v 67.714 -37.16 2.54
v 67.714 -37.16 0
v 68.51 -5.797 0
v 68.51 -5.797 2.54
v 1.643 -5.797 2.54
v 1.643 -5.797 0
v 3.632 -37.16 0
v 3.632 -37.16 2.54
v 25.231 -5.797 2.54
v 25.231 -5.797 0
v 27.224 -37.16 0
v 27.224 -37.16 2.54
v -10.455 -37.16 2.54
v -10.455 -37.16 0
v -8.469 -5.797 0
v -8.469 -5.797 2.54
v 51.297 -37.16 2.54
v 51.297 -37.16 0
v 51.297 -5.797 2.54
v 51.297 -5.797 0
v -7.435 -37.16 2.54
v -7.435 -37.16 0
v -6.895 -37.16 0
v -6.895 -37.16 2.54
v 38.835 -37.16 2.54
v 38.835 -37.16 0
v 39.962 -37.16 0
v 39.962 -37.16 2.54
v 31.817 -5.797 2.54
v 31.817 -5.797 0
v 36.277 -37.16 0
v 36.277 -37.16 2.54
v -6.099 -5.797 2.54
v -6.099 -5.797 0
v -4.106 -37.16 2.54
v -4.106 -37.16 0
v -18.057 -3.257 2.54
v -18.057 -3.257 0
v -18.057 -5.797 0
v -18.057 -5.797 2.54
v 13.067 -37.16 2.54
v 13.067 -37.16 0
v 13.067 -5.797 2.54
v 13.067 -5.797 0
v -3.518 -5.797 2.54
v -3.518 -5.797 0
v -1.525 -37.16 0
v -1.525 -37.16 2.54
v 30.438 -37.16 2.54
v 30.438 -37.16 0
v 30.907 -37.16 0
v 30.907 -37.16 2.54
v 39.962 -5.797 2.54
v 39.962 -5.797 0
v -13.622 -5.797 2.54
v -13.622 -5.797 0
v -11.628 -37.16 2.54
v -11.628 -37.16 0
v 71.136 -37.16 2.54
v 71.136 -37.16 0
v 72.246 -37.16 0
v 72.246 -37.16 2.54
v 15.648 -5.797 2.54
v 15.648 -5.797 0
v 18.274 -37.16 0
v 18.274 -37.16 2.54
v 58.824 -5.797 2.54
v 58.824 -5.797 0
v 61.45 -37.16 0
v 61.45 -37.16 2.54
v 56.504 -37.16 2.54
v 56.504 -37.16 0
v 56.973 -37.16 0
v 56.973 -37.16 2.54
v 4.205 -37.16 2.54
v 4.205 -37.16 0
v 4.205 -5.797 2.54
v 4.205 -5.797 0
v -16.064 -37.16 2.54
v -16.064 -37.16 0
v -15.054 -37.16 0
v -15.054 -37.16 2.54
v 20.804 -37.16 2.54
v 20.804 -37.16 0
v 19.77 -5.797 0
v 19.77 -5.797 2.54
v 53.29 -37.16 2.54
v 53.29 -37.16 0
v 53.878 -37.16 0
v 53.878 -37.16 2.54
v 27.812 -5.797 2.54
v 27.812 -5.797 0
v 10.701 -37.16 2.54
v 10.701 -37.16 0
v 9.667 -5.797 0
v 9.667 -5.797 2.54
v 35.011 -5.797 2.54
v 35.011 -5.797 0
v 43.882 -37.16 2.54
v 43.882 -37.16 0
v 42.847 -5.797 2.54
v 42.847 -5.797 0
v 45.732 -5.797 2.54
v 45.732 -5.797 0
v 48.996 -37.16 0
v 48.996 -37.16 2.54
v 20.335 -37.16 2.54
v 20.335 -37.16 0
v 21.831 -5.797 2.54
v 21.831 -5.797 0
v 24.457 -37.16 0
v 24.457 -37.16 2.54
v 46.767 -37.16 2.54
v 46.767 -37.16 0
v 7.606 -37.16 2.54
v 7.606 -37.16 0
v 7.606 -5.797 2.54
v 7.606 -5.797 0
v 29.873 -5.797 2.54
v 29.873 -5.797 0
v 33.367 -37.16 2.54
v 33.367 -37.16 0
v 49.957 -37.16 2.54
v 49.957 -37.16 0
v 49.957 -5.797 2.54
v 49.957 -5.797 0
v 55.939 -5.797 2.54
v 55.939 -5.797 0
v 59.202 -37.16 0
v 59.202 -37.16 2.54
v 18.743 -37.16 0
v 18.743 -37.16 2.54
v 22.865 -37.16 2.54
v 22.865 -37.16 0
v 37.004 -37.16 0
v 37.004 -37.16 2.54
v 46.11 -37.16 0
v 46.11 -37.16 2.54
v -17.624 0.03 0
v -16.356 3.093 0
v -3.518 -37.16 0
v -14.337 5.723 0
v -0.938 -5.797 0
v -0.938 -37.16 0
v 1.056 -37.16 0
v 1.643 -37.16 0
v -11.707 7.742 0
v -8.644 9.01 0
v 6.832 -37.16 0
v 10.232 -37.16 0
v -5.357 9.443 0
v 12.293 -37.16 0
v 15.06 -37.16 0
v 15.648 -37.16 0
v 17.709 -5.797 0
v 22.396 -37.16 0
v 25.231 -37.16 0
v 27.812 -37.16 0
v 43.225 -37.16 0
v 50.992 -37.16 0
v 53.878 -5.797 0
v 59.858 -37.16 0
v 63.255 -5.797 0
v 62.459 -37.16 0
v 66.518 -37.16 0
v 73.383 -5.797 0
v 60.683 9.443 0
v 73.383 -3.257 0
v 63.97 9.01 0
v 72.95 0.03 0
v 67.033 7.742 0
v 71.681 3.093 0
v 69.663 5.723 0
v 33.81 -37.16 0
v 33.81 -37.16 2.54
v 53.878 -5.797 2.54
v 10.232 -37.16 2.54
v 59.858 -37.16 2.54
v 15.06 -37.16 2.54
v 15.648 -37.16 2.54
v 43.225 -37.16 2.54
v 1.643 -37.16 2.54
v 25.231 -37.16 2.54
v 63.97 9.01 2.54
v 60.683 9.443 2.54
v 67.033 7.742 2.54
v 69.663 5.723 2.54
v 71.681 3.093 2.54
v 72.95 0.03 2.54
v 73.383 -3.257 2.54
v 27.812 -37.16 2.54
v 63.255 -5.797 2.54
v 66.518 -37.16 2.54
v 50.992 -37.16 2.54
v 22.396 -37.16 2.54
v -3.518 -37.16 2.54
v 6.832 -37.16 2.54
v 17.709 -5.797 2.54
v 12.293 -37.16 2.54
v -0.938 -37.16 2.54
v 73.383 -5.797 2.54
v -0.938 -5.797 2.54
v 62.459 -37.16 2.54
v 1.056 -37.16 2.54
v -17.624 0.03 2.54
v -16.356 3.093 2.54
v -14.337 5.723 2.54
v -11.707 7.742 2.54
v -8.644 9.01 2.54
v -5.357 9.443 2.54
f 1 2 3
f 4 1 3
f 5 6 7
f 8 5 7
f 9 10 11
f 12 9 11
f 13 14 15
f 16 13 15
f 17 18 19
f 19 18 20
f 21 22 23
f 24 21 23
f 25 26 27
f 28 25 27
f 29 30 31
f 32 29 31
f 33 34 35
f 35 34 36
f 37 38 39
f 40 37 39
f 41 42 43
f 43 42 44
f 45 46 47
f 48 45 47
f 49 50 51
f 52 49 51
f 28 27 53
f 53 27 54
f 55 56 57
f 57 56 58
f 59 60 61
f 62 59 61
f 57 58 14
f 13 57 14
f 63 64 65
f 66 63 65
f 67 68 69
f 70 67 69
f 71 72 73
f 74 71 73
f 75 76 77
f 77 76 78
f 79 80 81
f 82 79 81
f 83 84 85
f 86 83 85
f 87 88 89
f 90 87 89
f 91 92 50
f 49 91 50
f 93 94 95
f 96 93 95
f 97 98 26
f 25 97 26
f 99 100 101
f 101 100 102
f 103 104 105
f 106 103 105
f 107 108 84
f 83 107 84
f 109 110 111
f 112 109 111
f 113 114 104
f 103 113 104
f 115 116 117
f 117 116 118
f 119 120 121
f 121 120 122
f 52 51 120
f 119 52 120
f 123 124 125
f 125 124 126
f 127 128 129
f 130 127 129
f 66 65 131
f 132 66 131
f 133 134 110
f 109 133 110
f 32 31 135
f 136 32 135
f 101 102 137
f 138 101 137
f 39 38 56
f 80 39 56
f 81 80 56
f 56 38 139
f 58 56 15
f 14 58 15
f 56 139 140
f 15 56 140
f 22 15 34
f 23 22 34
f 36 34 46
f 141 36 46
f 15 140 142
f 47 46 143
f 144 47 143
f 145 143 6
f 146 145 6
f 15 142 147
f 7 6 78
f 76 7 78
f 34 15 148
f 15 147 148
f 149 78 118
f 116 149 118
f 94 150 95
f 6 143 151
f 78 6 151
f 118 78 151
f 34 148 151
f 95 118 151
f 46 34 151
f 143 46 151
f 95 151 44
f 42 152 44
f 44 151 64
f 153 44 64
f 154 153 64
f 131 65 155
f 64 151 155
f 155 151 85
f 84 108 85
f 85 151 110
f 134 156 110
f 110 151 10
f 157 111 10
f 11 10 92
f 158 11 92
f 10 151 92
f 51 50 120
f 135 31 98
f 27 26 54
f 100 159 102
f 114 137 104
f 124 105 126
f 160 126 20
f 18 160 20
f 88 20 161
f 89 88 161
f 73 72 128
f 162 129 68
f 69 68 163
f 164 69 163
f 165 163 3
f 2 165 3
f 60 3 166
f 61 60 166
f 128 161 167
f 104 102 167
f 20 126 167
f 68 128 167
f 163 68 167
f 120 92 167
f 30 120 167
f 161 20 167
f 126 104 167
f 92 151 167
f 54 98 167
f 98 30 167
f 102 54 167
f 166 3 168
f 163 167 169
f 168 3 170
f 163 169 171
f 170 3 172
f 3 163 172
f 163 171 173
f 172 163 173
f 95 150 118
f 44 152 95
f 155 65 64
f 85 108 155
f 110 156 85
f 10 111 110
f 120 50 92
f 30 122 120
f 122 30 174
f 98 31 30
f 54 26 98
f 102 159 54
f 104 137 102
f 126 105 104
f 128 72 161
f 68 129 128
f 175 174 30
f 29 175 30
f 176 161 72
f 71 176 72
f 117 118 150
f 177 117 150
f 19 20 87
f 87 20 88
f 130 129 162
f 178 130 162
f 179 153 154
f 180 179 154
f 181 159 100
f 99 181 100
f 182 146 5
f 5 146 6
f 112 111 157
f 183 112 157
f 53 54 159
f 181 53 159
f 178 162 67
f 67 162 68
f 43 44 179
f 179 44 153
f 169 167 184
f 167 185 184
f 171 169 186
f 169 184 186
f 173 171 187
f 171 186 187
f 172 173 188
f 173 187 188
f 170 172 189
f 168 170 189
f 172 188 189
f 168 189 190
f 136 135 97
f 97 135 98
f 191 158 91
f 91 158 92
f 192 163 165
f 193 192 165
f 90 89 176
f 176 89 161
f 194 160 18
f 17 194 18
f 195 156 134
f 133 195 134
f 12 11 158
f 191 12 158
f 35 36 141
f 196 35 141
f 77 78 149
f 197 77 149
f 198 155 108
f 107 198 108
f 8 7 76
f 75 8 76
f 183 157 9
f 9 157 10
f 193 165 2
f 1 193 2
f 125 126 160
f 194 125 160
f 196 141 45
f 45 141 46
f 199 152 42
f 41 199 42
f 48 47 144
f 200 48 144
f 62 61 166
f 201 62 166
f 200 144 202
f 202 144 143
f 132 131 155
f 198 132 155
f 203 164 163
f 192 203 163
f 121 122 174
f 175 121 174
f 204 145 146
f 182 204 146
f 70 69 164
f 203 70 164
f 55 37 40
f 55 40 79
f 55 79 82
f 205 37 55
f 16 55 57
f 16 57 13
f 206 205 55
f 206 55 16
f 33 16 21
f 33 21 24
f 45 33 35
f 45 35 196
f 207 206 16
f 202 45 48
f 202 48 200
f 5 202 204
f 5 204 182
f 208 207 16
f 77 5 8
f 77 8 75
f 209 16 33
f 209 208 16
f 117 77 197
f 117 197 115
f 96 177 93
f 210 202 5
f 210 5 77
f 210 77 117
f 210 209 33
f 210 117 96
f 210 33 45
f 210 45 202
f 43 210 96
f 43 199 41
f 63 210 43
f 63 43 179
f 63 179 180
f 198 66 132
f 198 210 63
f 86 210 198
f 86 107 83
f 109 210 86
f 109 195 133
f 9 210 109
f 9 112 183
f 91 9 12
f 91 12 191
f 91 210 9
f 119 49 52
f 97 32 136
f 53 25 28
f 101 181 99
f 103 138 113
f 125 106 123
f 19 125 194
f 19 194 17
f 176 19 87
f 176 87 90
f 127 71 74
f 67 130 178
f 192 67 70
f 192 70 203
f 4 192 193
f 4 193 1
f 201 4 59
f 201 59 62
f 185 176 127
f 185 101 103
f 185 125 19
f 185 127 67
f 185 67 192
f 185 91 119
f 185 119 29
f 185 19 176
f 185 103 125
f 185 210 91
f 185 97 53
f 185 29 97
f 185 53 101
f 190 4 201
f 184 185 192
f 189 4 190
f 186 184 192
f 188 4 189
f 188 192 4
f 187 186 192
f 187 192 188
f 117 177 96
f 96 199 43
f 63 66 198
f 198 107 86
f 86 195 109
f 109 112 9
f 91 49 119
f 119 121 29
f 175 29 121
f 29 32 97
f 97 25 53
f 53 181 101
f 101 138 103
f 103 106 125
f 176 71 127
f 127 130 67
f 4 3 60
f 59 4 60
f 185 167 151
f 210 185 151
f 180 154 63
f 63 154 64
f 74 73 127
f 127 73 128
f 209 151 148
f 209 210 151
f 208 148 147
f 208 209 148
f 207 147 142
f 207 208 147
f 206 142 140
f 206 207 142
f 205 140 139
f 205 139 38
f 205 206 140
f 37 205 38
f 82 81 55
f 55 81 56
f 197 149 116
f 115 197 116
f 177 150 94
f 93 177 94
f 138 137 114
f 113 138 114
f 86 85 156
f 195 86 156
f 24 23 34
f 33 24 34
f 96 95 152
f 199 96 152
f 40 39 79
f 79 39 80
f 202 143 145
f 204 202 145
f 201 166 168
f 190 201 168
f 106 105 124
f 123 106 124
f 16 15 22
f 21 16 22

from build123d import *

# Parameters (mm, degrees)
F1_DEPTH = 2.54
F2_R     = 12.7


with BuildPart() as f1:
    # F0 (on Top) → F1 (new body)
    with BuildSketch(Plane.XY):
        Polygon((73.3829085314, 9.4430754296), (-18.0570914686, 9.4430754296), (-18.0570914686, -5.7969245704), (-13.6215174571, -5.7969245704), (-8.4692621604, -5.7969245704), (-6.0992240906, -5.7969245704), (-3.5184609428, -5.7969245704), (-0.937697795, -5.7969245704), (1.6430653527, -5.7969245704), (4.2052869685, -5.7969245704), (7.6057757251, -5.7969245704), (9.6666784957, -5.7969245704), (13.0671672523, -5.7969245704), (15.6479304001, -5.7969245704), (17.7088331707, -5.7969245704), (19.7697359413, -5.7969245704), (21.8306387119, -5.7969245704), (25.2311274685, -5.7969245704), (27.8118906163, -5.7969245704), (29.8727933869, -5.7969245704), (31.816742076, -5.7969245704), (35.011141254, -5.7969245704), (39.9619415402, -5.7969245704), (42.8472035564, -5.7969245704), (45.7324655727, -5.7969245704), (49.9573135749, -5.7969245704), (51.2968995608, -5.7969245704), (53.8776627086, -5.7969245704), (55.9385654792, -5.7969245704), (58.8238274954, -5.7969245704), (63.2547683358, -5.7969245704), (68.5100684218, -5.7969245704), (73.3829085314, -5.7969245704), align=None)
        Polygon((-13.6215174571, -5.7969245704), (-18.0570914686, -5.7969245704), (-16.0638535681, -37.1604112962), (-15.0540701944, -37.1604112962), align=None)
        Polygon((-8.4692621604, -5.7969245704), (-13.6215174571, -5.7969245704), (-11.6282795566, -37.1604112962), (-10.455339657, -37.1604112962), align=None)
        Polygon((-6.0992240906, -5.7969245704), (-8.4692621604, -5.7969245704), (-7.4346404592, -37.1604112962), (-6.8950879612, -37.1604112962), align=None)
        Polygon((-3.5184609428, -5.7969245704), (-6.0992240906, -5.7969245704), (-4.1059861901, -37.1604112962), (-3.5184609428, -37.1604112962), align=None)
        Polygon((-0.937697795, -5.7969245704), (-3.5184609428, -5.7969245704), (-1.5252230424, -37.1604112962), (-0.937697795, -37.1604112962), align=None)
        Polygon((1.6430653527, -5.7969245704), (-0.937697795, -5.7969245704), (1.0555401054, -37.1604112962), (1.6430653527, -37.1604112962), align=None)
        Polygon((4.2052869685, -5.7969245704), (1.6430653527, -5.7969245704), (3.6320772404, -37.1604112962), (4.2052869685, -37.1604112962), align=None)
        Polygon((7.6057757251, -5.7969245704), (4.2052869685, -5.7969245704), (6.831635332, -37.1604112962), (7.6057757251, -37.1604112962), align=None)
        Polygon((13.0671672523, -5.7969245704), (9.6666784957, -5.7969245704), (12.2930268592, -37.1604112962), (13.0671672523, -37.1604112962), align=None)
        Polygon((15.6479304001, -5.7969245704), (13.0671672523, -5.7969245704), (15.0604051528, -37.1604112962), (15.6479304001, -37.1604112962), align=None)
        Polygon((17.7088331707, -5.7969245704), (15.6479304001, -5.7969245704), (18.2742787636, -37.1604112962), (18.7434548718, -37.1604112962), align=None)
        Polygon((19.7697359413, -5.7969245704), (17.7088331707, -5.7969245704), (20.3351815342, -37.1604112962), (20.8043576424, -37.1604112962), align=None)
        Polygon((21.8306387119, -5.7969245704), (19.7697359413, -5.7969245704), (22.3960843048, -37.1604112962), (22.865260413, -37.1604112962), align=None)
        Polygon((30.907415088, -37.1604112962), (29.8727933869, -5.7969245704), (27.8118906163, -5.7969245704), (30.4382389798, -37.1604112962), align=None)
        Polygon((33.8099799764, -37.1604112962), (31.816742076, -5.7969245704), (29.8727933869, -5.7969245704), (33.3674291227, -37.1604112962), align=None)
        Polygon((37.0043791545, -37.1604112962), (35.011141254, -5.7969245704), (31.816742076, -5.7969245704), (36.2771562132, -37.1604112962), align=None)
        Polygon((39.9619415402, -37.1604112962), (39.9619415402, -5.7969245704), (35.011141254, -5.7969245704), (38.834864007, -37.1604112962), align=None)
        Polygon((25.2311274685, -5.7969245704), (21.8306387119, -5.7969245704), (24.4569870754, -37.1604112962), (25.2311274685, -37.1604112962), align=None)
        Polygon((27.8118906163, -37.1604112962), (27.8118906163, -5.7969245704), (25.2311274685, -5.7969245704), (27.2243653689, -37.1604112962), align=None)
        Polygon((43.8818252576, -37.1604112962), (42.8472035564, -5.7969245704), (39.9619415402, -5.7969245704), (43.2249791301, -37.1604112962), align=None)
        Polygon((46.7670872738, -37.1604112962), (45.7324655727, -5.7969245704), (42.8472035564, -5.7969245704), (46.1102411463, -37.1604112962), align=None)
        Polygon((49.9573135749, -37.1604112962), (49.9573135749, -5.7969245704), (45.7324655727, -5.7969245704), (48.9955031625, -37.1604112962), align=None)
        Polygon((51.2968995608, -37.1604112962), (51.2968995608, -5.7969245704), (49.9573135749, -5.7969245704), (50.991935276, -37.1604112962), align=None)
        Polygon((53.8776627086, -37.1604112962), (53.8776627086, -5.7969245704), (51.2968995608, -5.7969245704), (53.2901374613, -37.1604112962), align=None)
        Polygon((56.9731871804, -37.1604112962), (55.9385654792, -5.7969245704), (53.8776627086, -5.7969245704), (56.5040110721, -37.1604112962), align=None)
        Polygon((59.8584491966, -37.1604112962), (58.8238274954, -5.7969245704), (55.9385654792, -5.7969245704), (59.201603069, -37.1604112962), align=None)
        Polygon((62.4589044652, -37.1604112962), (63.2547683358, -5.7969245704), (58.8238274954, -5.7969245704), (61.4501758589, -37.1604112962), align=None)
        Polygon((67.7142045512, -37.1604112962), (68.5100684218, -5.7969245704), (63.2547683358, -5.7969245704), (66.5178059256, -37.1604112962), align=None)
        Polygon((72.2457462459, -37.1604112962), (73.3829085314, -5.7969245704), (68.5100684218, -5.7969245704), (71.1364167853, -37.1604112962), align=None)
        Polygon((9.6666784957, -5.7969245704), (7.6057757251, -5.7969245704), (10.2321240886, -37.1604112962), (10.7013001968, -37.1604112962), align=None)
    extrude(amount=F1_DEPTH)

    # F2
    f2_edges = [f1.edges().sort_by_distance(p)[0] for p in [
        (73.382909, 9.443075, 1.27),
        (-18.057091, 9.443075, 1.27),
    ]]
    fillet(f2_edges, radius=F2_R)


solid = f1.part
